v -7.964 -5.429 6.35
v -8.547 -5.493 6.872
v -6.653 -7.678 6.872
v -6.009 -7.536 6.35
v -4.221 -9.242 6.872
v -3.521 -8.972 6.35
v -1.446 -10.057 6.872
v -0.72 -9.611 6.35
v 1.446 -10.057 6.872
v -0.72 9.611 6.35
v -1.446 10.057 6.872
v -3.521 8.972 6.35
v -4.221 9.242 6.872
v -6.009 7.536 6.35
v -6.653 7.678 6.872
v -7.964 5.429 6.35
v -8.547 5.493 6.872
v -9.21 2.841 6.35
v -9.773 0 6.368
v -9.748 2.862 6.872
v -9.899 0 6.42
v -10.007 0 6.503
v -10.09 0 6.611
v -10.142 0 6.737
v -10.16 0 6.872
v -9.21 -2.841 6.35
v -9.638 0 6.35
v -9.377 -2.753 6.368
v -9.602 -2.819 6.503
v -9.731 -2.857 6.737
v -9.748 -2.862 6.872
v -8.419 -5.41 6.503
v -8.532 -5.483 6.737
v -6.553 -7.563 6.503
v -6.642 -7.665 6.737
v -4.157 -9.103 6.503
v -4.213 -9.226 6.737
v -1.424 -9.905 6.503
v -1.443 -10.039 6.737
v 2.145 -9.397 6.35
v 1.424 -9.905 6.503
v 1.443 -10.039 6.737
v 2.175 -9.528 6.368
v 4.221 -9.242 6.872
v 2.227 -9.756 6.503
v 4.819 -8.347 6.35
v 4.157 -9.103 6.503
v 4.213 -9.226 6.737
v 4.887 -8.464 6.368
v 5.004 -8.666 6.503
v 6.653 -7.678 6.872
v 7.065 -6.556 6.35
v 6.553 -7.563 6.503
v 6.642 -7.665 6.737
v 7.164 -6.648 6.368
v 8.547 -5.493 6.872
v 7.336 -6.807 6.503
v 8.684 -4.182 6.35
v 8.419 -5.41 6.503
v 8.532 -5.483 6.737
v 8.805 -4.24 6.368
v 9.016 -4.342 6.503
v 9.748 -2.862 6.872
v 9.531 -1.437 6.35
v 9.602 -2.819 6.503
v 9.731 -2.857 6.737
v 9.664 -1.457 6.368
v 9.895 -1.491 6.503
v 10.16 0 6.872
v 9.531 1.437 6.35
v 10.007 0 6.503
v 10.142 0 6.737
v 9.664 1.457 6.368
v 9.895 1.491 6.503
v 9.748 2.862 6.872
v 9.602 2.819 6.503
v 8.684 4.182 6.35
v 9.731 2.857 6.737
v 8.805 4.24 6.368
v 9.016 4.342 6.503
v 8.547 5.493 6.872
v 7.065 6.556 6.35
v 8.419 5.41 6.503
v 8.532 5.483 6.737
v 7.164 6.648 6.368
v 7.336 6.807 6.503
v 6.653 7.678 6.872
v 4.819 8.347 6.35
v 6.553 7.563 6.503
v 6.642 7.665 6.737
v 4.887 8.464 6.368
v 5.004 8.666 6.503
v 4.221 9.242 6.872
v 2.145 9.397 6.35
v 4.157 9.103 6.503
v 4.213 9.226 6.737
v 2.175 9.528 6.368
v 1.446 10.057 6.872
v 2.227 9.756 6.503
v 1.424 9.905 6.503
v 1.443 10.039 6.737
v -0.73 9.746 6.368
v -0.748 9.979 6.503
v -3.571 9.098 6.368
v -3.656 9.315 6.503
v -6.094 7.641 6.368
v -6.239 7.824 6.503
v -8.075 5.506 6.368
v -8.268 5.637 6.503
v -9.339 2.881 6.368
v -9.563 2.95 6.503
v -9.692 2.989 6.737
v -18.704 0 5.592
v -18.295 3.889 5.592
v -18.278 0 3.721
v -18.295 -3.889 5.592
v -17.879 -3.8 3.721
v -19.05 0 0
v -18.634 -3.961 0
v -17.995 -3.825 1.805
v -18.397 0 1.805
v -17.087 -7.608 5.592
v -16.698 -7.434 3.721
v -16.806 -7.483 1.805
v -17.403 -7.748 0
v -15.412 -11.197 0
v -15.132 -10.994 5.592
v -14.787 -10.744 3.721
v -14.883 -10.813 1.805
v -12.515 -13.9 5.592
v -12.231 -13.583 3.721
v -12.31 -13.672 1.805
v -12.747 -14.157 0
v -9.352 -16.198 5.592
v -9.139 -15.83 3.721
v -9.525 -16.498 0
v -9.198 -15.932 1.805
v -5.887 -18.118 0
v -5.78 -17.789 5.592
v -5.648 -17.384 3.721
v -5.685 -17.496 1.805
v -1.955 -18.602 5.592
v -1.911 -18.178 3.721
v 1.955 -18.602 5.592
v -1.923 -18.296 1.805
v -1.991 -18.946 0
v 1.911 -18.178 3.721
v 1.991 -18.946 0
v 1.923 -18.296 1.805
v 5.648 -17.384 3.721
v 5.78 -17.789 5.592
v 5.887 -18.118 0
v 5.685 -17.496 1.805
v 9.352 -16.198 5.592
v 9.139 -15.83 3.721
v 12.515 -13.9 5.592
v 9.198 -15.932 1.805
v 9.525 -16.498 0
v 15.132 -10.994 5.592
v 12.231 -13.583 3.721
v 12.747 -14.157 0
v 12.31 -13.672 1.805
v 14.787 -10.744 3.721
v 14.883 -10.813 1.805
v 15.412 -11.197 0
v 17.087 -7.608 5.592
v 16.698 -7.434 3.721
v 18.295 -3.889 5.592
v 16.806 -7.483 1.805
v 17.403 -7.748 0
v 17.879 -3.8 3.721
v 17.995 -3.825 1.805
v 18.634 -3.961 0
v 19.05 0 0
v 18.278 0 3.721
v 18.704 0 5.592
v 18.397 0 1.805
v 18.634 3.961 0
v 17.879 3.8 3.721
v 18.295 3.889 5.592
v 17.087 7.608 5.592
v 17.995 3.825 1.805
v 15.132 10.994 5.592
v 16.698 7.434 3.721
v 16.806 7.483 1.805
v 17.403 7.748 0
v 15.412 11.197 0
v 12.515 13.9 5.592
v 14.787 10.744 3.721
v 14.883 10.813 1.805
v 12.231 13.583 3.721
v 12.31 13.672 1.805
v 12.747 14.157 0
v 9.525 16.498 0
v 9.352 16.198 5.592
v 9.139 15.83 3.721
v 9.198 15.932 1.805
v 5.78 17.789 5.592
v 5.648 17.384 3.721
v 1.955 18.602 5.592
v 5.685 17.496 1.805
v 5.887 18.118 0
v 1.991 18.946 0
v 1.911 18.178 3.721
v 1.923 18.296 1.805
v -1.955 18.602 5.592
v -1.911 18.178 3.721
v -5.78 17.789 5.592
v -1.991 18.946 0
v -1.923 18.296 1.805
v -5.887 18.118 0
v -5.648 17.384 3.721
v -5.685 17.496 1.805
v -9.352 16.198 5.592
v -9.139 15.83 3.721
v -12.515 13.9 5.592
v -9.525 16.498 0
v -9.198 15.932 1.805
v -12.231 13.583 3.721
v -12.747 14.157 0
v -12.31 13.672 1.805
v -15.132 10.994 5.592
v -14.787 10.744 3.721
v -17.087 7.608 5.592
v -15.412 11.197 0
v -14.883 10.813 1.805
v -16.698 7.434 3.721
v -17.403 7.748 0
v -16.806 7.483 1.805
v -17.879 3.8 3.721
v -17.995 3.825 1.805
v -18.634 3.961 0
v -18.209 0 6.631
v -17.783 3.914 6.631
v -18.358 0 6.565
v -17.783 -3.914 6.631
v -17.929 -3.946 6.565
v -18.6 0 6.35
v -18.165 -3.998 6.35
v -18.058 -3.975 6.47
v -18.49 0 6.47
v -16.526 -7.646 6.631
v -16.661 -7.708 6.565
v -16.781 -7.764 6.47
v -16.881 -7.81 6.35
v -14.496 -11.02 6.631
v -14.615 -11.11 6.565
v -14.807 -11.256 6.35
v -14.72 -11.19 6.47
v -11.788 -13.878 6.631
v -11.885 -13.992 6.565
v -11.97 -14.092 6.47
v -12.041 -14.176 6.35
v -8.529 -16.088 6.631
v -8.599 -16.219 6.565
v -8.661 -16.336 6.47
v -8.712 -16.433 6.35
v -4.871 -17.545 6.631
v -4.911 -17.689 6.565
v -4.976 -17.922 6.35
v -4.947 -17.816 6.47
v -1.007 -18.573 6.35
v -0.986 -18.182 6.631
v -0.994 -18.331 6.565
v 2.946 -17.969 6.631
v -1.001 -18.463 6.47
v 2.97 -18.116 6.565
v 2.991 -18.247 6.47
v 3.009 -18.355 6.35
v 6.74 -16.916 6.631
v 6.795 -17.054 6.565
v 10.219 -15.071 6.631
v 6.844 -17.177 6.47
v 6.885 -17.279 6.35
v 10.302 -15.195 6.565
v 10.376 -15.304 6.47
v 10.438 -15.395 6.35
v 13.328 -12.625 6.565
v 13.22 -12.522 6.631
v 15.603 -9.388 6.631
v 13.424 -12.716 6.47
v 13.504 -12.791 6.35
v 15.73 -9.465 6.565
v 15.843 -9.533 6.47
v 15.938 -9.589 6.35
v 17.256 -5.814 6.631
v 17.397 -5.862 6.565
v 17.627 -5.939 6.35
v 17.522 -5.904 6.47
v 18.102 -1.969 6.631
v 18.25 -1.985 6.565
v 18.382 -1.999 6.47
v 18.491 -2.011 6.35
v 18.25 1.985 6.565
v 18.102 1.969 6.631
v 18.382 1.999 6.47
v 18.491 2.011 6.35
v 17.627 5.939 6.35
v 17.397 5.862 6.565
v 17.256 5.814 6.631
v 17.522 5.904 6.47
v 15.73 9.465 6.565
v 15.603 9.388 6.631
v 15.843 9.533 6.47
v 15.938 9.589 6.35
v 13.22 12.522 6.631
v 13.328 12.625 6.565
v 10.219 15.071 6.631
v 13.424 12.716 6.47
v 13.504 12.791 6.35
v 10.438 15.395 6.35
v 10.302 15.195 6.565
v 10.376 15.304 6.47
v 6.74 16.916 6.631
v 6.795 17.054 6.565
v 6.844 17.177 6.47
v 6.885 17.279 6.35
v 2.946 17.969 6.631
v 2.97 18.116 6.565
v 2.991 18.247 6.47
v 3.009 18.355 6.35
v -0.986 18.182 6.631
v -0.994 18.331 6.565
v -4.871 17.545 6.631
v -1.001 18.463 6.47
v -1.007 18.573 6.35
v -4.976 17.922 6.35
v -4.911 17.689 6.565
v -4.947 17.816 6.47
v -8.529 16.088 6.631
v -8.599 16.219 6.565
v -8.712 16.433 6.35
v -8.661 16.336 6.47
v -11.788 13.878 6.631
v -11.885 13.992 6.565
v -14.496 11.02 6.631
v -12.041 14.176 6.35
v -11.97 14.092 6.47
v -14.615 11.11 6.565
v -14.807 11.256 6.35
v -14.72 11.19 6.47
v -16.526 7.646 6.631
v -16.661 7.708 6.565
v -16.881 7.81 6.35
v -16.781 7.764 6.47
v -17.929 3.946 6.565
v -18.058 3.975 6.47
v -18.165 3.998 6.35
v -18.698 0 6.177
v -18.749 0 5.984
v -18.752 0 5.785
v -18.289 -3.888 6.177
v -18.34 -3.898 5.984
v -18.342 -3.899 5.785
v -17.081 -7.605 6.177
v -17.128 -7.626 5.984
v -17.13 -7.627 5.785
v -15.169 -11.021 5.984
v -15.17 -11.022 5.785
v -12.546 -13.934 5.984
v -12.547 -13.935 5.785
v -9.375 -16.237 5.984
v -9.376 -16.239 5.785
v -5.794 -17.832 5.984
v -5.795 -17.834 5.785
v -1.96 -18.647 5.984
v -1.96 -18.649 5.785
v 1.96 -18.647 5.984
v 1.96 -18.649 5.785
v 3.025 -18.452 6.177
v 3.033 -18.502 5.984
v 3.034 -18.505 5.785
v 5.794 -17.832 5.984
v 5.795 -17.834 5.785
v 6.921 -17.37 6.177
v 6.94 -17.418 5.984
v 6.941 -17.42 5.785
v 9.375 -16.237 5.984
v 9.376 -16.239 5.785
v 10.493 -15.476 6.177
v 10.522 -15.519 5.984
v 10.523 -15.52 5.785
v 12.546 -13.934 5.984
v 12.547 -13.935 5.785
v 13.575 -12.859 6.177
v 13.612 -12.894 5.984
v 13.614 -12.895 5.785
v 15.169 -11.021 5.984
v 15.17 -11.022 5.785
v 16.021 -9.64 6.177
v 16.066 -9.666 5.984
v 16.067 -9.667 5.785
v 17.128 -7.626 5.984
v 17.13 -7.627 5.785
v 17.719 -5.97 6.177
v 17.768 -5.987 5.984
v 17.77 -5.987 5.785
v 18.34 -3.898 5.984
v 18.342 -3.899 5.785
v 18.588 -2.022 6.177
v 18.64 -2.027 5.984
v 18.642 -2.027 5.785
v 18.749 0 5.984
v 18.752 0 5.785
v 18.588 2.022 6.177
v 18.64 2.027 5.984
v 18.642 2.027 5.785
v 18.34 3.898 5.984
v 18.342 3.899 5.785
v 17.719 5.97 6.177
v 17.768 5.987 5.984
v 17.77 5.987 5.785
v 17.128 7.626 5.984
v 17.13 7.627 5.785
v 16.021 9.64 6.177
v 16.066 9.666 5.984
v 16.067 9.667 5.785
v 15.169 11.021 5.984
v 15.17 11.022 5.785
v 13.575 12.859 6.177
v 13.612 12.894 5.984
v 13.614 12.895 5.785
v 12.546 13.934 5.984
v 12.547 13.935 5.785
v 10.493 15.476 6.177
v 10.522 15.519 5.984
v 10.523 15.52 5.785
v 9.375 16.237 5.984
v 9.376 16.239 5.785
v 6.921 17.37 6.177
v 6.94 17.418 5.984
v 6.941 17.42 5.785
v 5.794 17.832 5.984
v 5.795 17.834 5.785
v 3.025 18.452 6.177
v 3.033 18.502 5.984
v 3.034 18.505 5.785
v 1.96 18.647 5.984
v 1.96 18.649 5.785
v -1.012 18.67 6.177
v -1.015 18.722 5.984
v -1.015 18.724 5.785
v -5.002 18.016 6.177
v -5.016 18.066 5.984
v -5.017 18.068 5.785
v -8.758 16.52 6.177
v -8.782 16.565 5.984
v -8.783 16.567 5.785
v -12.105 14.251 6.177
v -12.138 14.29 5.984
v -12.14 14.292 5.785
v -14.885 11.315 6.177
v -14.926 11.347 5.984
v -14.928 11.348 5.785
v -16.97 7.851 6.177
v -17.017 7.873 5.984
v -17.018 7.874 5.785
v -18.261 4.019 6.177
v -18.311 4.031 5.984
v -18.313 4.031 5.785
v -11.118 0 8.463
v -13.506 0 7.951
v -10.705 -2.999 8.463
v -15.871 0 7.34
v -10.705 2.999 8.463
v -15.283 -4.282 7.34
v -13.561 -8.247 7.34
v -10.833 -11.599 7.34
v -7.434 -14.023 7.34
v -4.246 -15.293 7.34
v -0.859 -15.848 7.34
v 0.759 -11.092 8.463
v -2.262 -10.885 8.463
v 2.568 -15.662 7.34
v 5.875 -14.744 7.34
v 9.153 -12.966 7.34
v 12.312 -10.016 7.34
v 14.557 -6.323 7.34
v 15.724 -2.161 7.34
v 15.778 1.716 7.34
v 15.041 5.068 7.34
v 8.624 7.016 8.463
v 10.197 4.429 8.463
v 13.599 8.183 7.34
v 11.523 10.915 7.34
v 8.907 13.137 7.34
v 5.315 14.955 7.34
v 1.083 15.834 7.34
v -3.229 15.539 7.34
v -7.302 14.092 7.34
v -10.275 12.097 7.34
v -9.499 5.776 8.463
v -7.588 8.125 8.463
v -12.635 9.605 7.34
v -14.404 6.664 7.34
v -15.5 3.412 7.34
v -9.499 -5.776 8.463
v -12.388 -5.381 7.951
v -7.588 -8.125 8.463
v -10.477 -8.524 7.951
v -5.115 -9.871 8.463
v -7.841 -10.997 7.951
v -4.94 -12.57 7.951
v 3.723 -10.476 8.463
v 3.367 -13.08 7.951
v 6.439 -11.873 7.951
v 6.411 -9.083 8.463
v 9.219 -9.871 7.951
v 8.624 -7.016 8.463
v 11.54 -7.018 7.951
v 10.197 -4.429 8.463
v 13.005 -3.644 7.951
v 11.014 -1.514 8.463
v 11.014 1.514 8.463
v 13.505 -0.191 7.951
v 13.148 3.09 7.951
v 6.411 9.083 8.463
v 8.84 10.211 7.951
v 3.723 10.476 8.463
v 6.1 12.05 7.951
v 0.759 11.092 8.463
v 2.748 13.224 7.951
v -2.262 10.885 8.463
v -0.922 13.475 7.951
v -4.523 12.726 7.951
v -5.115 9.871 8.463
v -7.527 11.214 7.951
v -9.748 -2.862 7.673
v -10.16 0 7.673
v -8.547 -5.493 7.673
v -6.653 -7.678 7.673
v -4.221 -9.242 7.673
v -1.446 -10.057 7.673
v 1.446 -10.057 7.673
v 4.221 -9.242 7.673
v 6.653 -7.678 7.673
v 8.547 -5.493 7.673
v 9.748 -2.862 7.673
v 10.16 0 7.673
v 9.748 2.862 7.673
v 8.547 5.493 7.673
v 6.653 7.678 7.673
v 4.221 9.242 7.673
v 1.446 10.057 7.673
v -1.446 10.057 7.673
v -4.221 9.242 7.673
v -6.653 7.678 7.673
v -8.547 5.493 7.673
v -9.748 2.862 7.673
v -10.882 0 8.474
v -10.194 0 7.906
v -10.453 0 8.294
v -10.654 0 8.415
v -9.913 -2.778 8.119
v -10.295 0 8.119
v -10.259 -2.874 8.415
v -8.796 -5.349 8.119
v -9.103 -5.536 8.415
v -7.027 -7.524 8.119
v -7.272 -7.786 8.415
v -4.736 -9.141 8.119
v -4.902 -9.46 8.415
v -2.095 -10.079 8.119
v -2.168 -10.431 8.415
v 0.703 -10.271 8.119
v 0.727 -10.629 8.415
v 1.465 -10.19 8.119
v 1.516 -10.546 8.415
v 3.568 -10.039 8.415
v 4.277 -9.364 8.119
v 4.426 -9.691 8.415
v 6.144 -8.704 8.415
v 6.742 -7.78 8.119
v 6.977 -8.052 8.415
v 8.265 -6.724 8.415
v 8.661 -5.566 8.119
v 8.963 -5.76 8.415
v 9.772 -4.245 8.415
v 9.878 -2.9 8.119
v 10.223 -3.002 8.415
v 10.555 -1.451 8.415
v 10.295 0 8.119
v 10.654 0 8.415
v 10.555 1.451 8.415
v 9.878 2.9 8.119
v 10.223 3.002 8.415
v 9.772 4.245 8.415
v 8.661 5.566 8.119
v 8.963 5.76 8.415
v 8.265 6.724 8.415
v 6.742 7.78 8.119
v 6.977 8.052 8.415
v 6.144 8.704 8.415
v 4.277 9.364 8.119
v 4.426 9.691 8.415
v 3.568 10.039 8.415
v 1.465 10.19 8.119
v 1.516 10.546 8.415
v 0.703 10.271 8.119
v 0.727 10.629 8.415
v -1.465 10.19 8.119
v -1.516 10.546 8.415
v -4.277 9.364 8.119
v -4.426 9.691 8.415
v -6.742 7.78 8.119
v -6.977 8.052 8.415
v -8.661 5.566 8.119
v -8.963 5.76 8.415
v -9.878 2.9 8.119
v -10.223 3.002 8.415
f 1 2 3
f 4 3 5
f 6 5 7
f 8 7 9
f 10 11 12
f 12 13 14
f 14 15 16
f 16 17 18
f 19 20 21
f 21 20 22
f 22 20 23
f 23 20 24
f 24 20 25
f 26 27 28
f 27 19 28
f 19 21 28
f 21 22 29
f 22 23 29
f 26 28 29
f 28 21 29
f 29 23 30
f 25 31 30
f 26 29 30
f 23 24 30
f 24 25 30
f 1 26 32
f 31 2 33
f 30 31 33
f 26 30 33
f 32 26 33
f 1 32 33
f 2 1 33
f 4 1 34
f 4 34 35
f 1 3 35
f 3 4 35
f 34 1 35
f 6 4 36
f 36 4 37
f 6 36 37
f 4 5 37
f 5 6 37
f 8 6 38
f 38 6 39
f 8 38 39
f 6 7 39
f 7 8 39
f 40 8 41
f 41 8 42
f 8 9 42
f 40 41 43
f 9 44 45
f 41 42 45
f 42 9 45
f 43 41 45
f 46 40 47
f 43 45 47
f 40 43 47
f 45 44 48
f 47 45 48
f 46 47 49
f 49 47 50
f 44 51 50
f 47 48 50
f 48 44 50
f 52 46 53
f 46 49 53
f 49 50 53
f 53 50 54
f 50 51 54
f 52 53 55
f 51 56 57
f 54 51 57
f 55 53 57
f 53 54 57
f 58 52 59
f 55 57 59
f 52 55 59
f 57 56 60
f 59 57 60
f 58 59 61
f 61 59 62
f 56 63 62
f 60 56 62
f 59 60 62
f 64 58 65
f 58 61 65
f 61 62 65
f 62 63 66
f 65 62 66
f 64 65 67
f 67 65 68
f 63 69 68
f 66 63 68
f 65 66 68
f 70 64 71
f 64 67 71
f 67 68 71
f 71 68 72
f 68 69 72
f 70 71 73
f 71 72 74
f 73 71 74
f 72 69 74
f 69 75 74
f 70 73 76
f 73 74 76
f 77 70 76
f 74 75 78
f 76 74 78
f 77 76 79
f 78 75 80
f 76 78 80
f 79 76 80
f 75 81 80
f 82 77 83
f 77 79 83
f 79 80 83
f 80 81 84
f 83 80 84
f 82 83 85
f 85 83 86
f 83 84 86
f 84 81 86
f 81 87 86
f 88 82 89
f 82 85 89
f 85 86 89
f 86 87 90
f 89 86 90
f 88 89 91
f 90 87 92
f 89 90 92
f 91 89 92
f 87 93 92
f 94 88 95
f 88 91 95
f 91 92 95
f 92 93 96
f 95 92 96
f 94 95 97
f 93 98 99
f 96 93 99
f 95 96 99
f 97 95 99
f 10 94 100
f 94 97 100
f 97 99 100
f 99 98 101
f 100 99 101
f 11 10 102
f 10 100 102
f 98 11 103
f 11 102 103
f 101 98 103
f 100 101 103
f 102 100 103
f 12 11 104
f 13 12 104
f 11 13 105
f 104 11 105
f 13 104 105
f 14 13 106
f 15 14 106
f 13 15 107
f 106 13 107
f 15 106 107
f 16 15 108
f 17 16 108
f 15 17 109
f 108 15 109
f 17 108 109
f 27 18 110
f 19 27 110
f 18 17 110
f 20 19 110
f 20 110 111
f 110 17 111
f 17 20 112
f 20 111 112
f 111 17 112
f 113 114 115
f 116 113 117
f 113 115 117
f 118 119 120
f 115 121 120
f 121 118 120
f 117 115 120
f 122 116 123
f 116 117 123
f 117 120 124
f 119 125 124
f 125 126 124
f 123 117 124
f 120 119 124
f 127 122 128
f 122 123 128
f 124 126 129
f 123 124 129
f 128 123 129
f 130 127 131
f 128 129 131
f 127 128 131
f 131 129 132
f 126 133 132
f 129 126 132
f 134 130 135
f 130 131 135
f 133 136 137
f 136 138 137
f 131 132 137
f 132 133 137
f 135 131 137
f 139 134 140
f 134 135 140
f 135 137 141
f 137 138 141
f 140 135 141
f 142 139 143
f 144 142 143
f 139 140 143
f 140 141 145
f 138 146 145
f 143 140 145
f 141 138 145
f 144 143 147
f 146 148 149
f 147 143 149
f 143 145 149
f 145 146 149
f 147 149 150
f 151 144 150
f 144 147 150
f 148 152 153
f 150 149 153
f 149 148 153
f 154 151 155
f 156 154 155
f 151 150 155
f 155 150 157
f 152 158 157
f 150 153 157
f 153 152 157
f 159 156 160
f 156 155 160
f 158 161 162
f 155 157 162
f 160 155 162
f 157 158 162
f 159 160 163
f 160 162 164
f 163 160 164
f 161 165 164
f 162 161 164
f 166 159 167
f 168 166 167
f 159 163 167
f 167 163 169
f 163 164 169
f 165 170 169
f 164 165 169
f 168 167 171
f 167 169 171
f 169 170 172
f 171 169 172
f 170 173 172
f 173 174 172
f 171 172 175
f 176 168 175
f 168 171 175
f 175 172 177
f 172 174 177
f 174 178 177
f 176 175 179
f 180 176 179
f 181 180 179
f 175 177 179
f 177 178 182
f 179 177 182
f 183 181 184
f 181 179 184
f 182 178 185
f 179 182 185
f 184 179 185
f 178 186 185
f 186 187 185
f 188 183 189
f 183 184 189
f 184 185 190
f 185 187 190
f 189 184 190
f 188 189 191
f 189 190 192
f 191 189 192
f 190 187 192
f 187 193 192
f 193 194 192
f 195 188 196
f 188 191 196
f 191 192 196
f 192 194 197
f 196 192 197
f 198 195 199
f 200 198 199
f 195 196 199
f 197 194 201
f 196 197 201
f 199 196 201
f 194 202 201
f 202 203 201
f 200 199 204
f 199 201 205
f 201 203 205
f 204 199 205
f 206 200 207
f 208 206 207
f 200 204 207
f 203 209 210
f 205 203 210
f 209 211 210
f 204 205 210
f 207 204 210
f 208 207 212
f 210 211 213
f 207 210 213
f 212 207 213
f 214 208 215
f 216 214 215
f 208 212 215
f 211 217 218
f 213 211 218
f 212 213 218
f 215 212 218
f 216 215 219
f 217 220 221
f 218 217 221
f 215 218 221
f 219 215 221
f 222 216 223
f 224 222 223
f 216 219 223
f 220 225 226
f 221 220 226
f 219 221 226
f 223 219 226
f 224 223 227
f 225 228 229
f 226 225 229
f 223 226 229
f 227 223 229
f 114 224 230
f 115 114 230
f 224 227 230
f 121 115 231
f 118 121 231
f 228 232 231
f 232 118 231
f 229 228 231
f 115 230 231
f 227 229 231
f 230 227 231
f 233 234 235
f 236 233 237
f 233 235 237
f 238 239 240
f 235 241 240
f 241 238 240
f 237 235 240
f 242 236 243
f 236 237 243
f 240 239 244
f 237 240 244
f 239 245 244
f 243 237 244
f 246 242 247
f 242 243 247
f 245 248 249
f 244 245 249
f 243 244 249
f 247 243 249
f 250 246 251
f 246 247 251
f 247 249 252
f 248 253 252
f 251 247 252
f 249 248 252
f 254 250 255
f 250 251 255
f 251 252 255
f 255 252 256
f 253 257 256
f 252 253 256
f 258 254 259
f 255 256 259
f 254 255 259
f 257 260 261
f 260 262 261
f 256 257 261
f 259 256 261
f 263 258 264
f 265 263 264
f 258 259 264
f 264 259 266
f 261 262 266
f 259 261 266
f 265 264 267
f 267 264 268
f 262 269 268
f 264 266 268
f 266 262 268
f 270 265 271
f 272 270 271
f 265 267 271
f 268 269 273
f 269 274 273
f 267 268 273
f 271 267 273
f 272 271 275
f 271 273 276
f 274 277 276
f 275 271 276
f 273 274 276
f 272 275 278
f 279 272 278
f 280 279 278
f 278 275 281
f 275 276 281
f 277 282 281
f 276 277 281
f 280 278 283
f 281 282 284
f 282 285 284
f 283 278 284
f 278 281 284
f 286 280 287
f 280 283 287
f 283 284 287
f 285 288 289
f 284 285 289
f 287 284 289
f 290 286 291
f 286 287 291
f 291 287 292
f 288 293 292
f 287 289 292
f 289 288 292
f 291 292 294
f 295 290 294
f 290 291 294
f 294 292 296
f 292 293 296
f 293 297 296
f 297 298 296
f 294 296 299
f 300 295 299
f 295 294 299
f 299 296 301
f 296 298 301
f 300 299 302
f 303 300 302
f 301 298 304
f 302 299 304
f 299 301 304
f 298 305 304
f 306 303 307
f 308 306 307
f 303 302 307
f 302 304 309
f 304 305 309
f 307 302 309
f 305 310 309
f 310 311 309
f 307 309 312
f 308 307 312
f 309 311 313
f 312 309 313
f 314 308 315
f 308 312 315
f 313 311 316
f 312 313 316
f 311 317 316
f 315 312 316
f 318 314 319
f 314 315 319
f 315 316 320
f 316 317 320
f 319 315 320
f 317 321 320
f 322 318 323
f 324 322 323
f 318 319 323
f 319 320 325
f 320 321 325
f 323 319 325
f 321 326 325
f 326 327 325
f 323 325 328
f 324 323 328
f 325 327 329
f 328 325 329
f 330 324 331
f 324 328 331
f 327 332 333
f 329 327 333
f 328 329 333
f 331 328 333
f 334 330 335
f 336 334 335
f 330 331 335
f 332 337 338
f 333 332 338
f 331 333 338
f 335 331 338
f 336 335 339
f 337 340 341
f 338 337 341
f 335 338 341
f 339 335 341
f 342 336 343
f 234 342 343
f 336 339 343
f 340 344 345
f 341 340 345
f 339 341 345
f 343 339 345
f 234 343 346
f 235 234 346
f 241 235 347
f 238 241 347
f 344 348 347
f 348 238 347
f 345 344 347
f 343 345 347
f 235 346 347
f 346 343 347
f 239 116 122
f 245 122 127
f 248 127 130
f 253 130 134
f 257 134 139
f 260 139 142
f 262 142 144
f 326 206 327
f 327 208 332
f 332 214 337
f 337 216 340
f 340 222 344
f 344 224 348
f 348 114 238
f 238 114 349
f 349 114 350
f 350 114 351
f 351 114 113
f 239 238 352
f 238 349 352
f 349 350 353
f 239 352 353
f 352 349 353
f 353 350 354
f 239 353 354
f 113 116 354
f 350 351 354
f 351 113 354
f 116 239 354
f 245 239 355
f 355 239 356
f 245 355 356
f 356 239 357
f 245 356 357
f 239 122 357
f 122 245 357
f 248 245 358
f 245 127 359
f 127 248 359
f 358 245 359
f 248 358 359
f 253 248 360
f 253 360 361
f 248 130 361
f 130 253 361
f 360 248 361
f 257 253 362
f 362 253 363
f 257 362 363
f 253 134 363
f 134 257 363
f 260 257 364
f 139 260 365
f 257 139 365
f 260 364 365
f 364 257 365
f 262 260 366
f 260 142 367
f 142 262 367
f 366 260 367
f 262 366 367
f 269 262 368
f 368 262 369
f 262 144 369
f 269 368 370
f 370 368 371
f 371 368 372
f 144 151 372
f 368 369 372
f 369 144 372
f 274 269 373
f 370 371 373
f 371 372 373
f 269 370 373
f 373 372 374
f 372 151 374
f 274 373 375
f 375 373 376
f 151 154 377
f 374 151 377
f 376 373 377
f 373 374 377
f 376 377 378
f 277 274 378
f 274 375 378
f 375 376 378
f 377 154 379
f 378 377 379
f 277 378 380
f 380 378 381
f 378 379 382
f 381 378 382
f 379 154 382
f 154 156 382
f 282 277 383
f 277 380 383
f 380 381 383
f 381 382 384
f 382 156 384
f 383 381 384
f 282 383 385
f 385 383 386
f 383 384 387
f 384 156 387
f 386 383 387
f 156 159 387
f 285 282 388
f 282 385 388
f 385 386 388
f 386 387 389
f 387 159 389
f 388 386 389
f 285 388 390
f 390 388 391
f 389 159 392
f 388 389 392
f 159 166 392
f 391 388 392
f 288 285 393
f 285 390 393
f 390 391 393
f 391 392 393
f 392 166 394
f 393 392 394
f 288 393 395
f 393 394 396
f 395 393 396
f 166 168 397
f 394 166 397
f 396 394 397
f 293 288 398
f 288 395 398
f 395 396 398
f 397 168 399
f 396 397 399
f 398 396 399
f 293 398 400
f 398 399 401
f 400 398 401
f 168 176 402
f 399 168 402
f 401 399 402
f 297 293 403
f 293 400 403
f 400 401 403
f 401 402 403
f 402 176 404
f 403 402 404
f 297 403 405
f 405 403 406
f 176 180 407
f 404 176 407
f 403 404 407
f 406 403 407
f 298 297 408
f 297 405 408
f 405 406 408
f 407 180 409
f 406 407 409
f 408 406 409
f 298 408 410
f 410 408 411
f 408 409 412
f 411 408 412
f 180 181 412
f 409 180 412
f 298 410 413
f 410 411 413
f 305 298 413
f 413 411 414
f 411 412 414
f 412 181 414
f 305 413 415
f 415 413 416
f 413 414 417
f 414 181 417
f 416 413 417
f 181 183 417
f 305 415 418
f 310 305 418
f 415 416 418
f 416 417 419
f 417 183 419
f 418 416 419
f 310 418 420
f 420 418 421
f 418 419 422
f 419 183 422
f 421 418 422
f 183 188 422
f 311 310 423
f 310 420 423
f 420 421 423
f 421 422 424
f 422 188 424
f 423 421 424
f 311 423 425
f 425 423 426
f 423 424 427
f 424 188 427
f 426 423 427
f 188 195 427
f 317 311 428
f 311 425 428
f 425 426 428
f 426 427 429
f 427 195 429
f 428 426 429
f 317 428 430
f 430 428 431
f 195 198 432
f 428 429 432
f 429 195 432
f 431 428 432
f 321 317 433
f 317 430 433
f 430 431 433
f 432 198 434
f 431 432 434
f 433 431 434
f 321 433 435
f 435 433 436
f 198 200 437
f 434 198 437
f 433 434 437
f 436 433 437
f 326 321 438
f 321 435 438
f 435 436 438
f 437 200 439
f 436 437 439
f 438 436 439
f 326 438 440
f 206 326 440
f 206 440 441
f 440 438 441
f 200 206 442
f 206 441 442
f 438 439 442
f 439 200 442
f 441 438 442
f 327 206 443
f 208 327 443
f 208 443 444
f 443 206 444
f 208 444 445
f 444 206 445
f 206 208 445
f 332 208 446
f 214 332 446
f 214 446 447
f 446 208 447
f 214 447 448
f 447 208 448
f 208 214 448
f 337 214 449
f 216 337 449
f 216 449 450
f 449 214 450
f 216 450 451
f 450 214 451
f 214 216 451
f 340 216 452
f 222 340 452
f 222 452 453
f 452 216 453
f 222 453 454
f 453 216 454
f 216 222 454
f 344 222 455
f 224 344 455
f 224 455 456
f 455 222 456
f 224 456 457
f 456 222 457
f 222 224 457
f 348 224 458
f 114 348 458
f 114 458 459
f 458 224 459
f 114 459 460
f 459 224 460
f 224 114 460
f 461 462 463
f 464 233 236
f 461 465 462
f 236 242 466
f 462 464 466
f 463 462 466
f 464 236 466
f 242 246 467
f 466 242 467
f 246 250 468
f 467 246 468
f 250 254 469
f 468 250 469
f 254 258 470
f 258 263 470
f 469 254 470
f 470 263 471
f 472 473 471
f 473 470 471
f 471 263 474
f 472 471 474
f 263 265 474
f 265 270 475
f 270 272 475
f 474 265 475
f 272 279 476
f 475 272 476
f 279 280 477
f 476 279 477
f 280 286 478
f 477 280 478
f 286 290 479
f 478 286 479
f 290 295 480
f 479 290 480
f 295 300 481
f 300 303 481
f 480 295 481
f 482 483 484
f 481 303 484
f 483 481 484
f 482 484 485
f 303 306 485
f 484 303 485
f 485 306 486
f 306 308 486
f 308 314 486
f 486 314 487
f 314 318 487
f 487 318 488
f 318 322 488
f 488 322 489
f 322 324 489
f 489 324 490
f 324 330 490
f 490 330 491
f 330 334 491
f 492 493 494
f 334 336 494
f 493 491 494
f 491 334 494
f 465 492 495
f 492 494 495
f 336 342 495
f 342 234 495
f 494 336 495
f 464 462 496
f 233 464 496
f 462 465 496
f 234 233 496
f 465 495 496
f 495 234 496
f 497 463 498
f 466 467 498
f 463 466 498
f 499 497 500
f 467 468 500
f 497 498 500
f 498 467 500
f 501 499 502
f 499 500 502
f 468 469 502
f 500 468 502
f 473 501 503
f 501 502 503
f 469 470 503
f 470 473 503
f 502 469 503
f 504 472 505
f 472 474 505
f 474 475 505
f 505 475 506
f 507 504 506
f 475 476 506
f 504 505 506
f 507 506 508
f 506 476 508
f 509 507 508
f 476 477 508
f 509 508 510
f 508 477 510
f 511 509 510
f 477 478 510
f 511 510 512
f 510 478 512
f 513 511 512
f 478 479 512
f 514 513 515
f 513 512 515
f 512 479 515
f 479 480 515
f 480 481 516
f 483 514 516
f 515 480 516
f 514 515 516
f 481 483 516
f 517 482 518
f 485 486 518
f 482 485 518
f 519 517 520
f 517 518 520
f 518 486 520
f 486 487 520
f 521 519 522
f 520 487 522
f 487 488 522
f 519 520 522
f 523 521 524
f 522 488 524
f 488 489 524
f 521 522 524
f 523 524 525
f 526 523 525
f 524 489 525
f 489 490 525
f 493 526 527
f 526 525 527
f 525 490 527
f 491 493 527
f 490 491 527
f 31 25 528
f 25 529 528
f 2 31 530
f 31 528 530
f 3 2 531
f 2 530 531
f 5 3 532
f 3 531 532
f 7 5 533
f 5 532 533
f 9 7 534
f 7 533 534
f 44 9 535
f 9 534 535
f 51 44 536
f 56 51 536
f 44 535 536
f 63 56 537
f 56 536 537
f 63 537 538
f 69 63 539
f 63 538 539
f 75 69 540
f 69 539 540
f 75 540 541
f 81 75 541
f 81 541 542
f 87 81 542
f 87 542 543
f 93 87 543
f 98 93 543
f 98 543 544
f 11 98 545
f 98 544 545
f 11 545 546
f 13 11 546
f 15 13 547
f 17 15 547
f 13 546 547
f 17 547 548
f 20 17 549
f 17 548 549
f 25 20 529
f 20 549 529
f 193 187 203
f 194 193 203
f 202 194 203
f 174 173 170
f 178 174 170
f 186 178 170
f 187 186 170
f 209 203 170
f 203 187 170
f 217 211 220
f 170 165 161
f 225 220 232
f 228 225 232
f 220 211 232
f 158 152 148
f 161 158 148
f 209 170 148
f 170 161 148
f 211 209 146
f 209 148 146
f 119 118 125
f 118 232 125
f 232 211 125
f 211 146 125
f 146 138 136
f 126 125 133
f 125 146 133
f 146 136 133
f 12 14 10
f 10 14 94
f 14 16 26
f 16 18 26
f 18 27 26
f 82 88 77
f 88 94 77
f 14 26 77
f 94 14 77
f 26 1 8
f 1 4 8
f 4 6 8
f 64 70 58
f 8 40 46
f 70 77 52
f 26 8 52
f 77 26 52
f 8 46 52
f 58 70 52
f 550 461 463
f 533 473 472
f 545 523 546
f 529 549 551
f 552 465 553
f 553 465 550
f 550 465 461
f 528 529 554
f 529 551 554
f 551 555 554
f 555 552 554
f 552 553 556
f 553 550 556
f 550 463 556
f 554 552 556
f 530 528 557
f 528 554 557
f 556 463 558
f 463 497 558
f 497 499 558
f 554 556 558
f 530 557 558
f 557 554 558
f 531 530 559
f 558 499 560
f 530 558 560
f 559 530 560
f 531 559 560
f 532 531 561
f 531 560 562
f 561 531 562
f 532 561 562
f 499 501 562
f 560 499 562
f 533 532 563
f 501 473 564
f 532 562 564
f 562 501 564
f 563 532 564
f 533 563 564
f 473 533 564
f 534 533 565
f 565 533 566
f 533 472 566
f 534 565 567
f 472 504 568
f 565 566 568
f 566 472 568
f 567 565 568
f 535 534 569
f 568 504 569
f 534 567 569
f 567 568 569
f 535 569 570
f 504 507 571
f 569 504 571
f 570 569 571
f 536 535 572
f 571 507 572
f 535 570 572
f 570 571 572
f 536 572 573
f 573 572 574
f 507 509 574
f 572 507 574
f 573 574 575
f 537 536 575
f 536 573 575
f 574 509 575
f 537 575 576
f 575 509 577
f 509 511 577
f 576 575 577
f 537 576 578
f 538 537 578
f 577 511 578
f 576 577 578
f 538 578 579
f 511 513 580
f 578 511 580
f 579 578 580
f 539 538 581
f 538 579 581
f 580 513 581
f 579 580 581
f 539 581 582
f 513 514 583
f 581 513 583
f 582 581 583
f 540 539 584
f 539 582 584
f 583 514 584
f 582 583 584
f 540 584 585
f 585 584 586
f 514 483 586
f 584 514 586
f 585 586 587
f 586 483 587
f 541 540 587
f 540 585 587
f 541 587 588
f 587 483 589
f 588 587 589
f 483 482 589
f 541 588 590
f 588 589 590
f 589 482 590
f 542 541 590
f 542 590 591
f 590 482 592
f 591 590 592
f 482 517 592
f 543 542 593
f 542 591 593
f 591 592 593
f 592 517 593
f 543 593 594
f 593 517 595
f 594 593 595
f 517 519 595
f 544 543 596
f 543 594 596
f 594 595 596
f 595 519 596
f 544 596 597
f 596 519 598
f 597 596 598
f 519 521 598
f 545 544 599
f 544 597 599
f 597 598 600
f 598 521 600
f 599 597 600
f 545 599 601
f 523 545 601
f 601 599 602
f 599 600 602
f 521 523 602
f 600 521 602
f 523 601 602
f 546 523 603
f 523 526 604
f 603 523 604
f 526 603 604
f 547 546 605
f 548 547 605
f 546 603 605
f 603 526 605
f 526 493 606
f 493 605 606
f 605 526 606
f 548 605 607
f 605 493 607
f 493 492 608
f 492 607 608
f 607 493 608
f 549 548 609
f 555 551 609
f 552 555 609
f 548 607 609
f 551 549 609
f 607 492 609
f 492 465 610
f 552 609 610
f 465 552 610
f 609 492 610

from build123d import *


with BuildPart() as f1:
    # F0 (on Front) → F1 (revolve)
    with BuildSketch(Plane.XZ):
        with BuildLine():
            Line((-19.05, 0), (0, 0))
            Line((0, 0), (0, 6.35))
            Line((0, 6.35), (-9.638313, 6.35))
            ThreePointArc((-9.638313, 6.35), (-10.007201, 6.502799), (-10.16, 6.871687))
            Line((-10.16, 6.871687), (-10.16, 7.67267))
            ThreePointArc((-10.16, 7.67267), (-10.452527, 8.293544), (-11.117546, 8.463267))
            ThreePointArc((-11.117546, 8.463267), (-14.691922, 7.657891), (-18.209131, 6.631224))
            ThreePointArc((-18.209131, 6.631224), (-18.426498, 6.520989), (-18.600173, 6.35))
            ThreePointArc((-18.600173, 6.35), (-18.749447, 5.984448), (-18.704121, 5.592202))
            ThreePointArc((-18.704121, 5.592202), (-18.269118, 2.7585), (-19.05, 0))
        make_face()
    revolve(axis=Axis((0, 0, 3.175), (0, 0, 1)))


solid = f1.part
